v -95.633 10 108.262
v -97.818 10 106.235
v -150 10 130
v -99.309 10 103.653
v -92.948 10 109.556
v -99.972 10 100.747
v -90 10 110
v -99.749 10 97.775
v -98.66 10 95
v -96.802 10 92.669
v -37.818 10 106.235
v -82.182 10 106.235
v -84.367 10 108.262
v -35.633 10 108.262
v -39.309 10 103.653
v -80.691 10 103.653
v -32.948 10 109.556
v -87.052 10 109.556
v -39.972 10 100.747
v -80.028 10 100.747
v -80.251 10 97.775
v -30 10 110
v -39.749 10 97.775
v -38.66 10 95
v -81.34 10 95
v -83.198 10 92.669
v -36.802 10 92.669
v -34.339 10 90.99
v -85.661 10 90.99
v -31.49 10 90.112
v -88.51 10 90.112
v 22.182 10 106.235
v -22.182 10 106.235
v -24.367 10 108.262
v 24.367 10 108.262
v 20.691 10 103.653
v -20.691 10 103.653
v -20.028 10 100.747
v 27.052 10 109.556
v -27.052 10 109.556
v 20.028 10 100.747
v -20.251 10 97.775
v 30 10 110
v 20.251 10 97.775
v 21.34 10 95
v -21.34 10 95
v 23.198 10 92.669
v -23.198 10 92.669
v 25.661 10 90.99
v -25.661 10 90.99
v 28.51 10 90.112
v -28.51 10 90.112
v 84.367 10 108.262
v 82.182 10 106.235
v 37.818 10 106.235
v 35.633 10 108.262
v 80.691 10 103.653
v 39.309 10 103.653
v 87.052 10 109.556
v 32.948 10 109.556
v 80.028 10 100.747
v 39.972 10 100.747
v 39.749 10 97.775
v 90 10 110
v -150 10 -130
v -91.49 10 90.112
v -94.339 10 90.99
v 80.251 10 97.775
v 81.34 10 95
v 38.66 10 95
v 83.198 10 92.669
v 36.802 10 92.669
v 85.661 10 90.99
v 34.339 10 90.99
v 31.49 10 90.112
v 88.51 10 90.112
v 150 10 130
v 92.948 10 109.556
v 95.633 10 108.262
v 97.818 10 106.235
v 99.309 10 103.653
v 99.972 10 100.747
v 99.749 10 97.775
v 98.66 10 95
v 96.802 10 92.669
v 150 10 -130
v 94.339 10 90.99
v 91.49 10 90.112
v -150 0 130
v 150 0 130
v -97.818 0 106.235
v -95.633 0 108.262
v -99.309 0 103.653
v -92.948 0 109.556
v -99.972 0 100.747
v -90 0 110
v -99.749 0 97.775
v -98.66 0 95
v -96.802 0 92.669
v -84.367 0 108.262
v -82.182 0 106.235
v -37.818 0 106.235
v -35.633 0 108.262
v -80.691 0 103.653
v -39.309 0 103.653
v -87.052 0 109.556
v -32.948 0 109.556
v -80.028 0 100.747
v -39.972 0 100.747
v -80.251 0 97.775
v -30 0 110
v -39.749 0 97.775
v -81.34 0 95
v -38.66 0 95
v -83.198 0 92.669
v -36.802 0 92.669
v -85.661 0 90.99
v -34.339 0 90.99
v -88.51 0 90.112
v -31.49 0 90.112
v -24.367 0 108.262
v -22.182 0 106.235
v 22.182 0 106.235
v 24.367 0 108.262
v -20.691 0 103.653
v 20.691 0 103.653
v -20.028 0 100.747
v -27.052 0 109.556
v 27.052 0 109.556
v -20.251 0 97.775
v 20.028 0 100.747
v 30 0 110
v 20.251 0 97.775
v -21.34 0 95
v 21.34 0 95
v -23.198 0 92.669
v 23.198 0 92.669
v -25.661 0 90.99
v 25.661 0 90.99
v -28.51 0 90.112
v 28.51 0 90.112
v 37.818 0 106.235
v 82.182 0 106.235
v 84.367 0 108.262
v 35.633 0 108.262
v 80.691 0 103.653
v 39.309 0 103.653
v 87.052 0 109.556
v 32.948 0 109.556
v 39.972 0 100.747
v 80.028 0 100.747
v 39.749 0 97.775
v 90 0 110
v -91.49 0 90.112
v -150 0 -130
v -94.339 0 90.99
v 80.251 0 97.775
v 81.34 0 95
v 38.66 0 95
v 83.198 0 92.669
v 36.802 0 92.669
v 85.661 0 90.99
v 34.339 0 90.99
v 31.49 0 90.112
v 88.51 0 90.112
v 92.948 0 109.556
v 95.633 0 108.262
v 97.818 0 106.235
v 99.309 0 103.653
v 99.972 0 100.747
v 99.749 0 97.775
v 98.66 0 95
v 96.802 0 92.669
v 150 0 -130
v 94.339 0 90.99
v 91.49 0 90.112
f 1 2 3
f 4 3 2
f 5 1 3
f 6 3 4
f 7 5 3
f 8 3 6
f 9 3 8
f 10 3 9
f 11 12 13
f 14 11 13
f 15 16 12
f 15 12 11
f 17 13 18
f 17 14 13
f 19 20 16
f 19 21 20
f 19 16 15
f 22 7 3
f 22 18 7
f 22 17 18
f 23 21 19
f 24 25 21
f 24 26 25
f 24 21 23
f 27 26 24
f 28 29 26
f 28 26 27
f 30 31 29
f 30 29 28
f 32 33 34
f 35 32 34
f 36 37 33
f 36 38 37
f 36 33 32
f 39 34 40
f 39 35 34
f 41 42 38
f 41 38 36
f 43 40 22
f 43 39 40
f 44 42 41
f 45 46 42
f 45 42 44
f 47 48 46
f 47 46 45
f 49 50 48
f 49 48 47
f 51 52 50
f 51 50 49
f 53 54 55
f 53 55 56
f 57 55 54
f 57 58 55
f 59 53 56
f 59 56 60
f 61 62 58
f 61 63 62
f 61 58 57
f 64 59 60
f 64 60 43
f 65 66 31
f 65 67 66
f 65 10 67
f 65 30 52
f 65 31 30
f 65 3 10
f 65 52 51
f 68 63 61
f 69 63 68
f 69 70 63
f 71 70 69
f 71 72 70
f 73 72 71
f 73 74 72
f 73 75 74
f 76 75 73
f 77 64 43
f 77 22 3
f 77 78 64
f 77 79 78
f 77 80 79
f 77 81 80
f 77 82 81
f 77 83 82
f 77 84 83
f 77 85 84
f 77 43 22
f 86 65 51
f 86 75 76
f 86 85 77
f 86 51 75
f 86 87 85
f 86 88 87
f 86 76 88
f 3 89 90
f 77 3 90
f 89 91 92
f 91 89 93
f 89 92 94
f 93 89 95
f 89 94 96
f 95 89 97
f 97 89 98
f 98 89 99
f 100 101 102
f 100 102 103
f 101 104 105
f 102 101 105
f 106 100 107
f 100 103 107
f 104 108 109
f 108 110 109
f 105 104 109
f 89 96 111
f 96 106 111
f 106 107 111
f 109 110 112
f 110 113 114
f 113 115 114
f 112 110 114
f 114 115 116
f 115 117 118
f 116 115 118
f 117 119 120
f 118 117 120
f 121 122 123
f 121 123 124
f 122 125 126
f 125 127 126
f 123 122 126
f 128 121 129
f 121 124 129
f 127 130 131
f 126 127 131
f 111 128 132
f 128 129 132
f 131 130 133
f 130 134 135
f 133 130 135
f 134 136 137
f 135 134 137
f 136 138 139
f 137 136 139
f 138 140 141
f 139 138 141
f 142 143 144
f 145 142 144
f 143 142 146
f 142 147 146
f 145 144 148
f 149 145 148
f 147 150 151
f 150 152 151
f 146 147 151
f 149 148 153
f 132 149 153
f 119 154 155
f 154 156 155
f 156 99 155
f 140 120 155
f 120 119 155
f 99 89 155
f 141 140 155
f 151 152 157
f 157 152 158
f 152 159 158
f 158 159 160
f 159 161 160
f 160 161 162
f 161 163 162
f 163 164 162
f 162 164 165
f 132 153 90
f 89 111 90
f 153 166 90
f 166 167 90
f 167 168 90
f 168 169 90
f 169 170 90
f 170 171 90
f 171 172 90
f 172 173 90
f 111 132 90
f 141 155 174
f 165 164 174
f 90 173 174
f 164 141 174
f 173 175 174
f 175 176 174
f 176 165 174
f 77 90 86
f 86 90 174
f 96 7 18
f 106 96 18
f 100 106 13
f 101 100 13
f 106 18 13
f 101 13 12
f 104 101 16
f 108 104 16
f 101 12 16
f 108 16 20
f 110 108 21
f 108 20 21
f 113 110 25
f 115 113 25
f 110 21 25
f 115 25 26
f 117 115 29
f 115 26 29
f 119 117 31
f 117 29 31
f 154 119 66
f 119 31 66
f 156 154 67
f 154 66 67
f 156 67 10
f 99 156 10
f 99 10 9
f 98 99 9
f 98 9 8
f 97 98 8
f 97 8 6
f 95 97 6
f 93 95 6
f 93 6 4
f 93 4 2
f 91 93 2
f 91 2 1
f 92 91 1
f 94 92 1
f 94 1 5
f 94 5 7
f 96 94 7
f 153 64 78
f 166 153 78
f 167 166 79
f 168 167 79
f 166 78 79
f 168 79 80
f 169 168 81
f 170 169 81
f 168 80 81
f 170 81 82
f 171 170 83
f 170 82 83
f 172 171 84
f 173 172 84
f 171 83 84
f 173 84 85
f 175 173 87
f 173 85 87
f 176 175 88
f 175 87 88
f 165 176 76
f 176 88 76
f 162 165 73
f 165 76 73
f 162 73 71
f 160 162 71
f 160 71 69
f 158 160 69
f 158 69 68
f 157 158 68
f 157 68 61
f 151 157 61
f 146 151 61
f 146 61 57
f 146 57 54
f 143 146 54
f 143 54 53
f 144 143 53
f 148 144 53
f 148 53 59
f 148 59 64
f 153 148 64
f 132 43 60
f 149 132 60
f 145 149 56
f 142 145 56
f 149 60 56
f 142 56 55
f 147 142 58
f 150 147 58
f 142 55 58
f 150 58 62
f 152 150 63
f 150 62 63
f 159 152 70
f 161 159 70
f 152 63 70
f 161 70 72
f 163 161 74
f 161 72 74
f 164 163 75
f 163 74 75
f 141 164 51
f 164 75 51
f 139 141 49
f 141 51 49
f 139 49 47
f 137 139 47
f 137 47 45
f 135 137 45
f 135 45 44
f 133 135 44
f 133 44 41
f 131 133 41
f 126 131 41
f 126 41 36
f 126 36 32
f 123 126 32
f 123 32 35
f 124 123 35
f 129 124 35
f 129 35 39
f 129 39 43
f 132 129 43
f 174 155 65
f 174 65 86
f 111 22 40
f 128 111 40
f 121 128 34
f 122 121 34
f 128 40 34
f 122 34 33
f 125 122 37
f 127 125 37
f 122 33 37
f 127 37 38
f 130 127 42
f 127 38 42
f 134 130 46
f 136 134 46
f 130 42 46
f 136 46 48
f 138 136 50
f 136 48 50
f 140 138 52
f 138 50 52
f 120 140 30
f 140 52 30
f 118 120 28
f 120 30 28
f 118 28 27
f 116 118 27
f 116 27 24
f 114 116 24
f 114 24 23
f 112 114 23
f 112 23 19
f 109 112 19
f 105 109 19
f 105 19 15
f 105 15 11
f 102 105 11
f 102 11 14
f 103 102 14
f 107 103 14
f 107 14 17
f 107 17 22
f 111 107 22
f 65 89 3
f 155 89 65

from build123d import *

# Parameters (mm, degrees)
SKETCH1_W           = 300
SKETCH1_H           = 260
BOSS_EXTRUDE1_DEPTH = 10
SKETCH2_R           = 10
CUT_EXTRUDE1_DEPTH  = 199.746069144
LPATTERN1_COUNT     = 4
LPATTERN1_PITCH     = 60


with BuildPart() as part:
    # Sketch1 → Boss-Extrude1 (new body)
    with BuildSketch(Plane(origin=(0, 0, 0), x_dir=(1, 0, 0), z_dir=(0, 1, 0))):
        Rectangle(SKETCH1_W, SKETCH1_H)
    extrude(amount=BOSS_EXTRUDE1_DEPTH)

    # Sketch2 → Cut-Extrude1 (cut, through all)
    with BuildSketch(Plane(origin=(0, 10, 0), x_dir=(1, 0, 0), z_dir=(0, 1, 0))):
        with Locations(Location((-90, -100, 0), (0, 0, 270))):
            Circle(SKETCH2_R)
    cut_extrude1 = extrude(amount=-CUT_EXTRUDE1_DEPTH, mode=Mode.SUBTRACT)

    # LPattern1: Cut-Extrude1 ×4
    with Locations(*[(i * LPATTERN1_PITCH, 0, 0) for i in range(1, LPATTERN1_COUNT)]):
        add(cut_extrude1, mode=Mode.SUBTRACT)


solid = part.part
